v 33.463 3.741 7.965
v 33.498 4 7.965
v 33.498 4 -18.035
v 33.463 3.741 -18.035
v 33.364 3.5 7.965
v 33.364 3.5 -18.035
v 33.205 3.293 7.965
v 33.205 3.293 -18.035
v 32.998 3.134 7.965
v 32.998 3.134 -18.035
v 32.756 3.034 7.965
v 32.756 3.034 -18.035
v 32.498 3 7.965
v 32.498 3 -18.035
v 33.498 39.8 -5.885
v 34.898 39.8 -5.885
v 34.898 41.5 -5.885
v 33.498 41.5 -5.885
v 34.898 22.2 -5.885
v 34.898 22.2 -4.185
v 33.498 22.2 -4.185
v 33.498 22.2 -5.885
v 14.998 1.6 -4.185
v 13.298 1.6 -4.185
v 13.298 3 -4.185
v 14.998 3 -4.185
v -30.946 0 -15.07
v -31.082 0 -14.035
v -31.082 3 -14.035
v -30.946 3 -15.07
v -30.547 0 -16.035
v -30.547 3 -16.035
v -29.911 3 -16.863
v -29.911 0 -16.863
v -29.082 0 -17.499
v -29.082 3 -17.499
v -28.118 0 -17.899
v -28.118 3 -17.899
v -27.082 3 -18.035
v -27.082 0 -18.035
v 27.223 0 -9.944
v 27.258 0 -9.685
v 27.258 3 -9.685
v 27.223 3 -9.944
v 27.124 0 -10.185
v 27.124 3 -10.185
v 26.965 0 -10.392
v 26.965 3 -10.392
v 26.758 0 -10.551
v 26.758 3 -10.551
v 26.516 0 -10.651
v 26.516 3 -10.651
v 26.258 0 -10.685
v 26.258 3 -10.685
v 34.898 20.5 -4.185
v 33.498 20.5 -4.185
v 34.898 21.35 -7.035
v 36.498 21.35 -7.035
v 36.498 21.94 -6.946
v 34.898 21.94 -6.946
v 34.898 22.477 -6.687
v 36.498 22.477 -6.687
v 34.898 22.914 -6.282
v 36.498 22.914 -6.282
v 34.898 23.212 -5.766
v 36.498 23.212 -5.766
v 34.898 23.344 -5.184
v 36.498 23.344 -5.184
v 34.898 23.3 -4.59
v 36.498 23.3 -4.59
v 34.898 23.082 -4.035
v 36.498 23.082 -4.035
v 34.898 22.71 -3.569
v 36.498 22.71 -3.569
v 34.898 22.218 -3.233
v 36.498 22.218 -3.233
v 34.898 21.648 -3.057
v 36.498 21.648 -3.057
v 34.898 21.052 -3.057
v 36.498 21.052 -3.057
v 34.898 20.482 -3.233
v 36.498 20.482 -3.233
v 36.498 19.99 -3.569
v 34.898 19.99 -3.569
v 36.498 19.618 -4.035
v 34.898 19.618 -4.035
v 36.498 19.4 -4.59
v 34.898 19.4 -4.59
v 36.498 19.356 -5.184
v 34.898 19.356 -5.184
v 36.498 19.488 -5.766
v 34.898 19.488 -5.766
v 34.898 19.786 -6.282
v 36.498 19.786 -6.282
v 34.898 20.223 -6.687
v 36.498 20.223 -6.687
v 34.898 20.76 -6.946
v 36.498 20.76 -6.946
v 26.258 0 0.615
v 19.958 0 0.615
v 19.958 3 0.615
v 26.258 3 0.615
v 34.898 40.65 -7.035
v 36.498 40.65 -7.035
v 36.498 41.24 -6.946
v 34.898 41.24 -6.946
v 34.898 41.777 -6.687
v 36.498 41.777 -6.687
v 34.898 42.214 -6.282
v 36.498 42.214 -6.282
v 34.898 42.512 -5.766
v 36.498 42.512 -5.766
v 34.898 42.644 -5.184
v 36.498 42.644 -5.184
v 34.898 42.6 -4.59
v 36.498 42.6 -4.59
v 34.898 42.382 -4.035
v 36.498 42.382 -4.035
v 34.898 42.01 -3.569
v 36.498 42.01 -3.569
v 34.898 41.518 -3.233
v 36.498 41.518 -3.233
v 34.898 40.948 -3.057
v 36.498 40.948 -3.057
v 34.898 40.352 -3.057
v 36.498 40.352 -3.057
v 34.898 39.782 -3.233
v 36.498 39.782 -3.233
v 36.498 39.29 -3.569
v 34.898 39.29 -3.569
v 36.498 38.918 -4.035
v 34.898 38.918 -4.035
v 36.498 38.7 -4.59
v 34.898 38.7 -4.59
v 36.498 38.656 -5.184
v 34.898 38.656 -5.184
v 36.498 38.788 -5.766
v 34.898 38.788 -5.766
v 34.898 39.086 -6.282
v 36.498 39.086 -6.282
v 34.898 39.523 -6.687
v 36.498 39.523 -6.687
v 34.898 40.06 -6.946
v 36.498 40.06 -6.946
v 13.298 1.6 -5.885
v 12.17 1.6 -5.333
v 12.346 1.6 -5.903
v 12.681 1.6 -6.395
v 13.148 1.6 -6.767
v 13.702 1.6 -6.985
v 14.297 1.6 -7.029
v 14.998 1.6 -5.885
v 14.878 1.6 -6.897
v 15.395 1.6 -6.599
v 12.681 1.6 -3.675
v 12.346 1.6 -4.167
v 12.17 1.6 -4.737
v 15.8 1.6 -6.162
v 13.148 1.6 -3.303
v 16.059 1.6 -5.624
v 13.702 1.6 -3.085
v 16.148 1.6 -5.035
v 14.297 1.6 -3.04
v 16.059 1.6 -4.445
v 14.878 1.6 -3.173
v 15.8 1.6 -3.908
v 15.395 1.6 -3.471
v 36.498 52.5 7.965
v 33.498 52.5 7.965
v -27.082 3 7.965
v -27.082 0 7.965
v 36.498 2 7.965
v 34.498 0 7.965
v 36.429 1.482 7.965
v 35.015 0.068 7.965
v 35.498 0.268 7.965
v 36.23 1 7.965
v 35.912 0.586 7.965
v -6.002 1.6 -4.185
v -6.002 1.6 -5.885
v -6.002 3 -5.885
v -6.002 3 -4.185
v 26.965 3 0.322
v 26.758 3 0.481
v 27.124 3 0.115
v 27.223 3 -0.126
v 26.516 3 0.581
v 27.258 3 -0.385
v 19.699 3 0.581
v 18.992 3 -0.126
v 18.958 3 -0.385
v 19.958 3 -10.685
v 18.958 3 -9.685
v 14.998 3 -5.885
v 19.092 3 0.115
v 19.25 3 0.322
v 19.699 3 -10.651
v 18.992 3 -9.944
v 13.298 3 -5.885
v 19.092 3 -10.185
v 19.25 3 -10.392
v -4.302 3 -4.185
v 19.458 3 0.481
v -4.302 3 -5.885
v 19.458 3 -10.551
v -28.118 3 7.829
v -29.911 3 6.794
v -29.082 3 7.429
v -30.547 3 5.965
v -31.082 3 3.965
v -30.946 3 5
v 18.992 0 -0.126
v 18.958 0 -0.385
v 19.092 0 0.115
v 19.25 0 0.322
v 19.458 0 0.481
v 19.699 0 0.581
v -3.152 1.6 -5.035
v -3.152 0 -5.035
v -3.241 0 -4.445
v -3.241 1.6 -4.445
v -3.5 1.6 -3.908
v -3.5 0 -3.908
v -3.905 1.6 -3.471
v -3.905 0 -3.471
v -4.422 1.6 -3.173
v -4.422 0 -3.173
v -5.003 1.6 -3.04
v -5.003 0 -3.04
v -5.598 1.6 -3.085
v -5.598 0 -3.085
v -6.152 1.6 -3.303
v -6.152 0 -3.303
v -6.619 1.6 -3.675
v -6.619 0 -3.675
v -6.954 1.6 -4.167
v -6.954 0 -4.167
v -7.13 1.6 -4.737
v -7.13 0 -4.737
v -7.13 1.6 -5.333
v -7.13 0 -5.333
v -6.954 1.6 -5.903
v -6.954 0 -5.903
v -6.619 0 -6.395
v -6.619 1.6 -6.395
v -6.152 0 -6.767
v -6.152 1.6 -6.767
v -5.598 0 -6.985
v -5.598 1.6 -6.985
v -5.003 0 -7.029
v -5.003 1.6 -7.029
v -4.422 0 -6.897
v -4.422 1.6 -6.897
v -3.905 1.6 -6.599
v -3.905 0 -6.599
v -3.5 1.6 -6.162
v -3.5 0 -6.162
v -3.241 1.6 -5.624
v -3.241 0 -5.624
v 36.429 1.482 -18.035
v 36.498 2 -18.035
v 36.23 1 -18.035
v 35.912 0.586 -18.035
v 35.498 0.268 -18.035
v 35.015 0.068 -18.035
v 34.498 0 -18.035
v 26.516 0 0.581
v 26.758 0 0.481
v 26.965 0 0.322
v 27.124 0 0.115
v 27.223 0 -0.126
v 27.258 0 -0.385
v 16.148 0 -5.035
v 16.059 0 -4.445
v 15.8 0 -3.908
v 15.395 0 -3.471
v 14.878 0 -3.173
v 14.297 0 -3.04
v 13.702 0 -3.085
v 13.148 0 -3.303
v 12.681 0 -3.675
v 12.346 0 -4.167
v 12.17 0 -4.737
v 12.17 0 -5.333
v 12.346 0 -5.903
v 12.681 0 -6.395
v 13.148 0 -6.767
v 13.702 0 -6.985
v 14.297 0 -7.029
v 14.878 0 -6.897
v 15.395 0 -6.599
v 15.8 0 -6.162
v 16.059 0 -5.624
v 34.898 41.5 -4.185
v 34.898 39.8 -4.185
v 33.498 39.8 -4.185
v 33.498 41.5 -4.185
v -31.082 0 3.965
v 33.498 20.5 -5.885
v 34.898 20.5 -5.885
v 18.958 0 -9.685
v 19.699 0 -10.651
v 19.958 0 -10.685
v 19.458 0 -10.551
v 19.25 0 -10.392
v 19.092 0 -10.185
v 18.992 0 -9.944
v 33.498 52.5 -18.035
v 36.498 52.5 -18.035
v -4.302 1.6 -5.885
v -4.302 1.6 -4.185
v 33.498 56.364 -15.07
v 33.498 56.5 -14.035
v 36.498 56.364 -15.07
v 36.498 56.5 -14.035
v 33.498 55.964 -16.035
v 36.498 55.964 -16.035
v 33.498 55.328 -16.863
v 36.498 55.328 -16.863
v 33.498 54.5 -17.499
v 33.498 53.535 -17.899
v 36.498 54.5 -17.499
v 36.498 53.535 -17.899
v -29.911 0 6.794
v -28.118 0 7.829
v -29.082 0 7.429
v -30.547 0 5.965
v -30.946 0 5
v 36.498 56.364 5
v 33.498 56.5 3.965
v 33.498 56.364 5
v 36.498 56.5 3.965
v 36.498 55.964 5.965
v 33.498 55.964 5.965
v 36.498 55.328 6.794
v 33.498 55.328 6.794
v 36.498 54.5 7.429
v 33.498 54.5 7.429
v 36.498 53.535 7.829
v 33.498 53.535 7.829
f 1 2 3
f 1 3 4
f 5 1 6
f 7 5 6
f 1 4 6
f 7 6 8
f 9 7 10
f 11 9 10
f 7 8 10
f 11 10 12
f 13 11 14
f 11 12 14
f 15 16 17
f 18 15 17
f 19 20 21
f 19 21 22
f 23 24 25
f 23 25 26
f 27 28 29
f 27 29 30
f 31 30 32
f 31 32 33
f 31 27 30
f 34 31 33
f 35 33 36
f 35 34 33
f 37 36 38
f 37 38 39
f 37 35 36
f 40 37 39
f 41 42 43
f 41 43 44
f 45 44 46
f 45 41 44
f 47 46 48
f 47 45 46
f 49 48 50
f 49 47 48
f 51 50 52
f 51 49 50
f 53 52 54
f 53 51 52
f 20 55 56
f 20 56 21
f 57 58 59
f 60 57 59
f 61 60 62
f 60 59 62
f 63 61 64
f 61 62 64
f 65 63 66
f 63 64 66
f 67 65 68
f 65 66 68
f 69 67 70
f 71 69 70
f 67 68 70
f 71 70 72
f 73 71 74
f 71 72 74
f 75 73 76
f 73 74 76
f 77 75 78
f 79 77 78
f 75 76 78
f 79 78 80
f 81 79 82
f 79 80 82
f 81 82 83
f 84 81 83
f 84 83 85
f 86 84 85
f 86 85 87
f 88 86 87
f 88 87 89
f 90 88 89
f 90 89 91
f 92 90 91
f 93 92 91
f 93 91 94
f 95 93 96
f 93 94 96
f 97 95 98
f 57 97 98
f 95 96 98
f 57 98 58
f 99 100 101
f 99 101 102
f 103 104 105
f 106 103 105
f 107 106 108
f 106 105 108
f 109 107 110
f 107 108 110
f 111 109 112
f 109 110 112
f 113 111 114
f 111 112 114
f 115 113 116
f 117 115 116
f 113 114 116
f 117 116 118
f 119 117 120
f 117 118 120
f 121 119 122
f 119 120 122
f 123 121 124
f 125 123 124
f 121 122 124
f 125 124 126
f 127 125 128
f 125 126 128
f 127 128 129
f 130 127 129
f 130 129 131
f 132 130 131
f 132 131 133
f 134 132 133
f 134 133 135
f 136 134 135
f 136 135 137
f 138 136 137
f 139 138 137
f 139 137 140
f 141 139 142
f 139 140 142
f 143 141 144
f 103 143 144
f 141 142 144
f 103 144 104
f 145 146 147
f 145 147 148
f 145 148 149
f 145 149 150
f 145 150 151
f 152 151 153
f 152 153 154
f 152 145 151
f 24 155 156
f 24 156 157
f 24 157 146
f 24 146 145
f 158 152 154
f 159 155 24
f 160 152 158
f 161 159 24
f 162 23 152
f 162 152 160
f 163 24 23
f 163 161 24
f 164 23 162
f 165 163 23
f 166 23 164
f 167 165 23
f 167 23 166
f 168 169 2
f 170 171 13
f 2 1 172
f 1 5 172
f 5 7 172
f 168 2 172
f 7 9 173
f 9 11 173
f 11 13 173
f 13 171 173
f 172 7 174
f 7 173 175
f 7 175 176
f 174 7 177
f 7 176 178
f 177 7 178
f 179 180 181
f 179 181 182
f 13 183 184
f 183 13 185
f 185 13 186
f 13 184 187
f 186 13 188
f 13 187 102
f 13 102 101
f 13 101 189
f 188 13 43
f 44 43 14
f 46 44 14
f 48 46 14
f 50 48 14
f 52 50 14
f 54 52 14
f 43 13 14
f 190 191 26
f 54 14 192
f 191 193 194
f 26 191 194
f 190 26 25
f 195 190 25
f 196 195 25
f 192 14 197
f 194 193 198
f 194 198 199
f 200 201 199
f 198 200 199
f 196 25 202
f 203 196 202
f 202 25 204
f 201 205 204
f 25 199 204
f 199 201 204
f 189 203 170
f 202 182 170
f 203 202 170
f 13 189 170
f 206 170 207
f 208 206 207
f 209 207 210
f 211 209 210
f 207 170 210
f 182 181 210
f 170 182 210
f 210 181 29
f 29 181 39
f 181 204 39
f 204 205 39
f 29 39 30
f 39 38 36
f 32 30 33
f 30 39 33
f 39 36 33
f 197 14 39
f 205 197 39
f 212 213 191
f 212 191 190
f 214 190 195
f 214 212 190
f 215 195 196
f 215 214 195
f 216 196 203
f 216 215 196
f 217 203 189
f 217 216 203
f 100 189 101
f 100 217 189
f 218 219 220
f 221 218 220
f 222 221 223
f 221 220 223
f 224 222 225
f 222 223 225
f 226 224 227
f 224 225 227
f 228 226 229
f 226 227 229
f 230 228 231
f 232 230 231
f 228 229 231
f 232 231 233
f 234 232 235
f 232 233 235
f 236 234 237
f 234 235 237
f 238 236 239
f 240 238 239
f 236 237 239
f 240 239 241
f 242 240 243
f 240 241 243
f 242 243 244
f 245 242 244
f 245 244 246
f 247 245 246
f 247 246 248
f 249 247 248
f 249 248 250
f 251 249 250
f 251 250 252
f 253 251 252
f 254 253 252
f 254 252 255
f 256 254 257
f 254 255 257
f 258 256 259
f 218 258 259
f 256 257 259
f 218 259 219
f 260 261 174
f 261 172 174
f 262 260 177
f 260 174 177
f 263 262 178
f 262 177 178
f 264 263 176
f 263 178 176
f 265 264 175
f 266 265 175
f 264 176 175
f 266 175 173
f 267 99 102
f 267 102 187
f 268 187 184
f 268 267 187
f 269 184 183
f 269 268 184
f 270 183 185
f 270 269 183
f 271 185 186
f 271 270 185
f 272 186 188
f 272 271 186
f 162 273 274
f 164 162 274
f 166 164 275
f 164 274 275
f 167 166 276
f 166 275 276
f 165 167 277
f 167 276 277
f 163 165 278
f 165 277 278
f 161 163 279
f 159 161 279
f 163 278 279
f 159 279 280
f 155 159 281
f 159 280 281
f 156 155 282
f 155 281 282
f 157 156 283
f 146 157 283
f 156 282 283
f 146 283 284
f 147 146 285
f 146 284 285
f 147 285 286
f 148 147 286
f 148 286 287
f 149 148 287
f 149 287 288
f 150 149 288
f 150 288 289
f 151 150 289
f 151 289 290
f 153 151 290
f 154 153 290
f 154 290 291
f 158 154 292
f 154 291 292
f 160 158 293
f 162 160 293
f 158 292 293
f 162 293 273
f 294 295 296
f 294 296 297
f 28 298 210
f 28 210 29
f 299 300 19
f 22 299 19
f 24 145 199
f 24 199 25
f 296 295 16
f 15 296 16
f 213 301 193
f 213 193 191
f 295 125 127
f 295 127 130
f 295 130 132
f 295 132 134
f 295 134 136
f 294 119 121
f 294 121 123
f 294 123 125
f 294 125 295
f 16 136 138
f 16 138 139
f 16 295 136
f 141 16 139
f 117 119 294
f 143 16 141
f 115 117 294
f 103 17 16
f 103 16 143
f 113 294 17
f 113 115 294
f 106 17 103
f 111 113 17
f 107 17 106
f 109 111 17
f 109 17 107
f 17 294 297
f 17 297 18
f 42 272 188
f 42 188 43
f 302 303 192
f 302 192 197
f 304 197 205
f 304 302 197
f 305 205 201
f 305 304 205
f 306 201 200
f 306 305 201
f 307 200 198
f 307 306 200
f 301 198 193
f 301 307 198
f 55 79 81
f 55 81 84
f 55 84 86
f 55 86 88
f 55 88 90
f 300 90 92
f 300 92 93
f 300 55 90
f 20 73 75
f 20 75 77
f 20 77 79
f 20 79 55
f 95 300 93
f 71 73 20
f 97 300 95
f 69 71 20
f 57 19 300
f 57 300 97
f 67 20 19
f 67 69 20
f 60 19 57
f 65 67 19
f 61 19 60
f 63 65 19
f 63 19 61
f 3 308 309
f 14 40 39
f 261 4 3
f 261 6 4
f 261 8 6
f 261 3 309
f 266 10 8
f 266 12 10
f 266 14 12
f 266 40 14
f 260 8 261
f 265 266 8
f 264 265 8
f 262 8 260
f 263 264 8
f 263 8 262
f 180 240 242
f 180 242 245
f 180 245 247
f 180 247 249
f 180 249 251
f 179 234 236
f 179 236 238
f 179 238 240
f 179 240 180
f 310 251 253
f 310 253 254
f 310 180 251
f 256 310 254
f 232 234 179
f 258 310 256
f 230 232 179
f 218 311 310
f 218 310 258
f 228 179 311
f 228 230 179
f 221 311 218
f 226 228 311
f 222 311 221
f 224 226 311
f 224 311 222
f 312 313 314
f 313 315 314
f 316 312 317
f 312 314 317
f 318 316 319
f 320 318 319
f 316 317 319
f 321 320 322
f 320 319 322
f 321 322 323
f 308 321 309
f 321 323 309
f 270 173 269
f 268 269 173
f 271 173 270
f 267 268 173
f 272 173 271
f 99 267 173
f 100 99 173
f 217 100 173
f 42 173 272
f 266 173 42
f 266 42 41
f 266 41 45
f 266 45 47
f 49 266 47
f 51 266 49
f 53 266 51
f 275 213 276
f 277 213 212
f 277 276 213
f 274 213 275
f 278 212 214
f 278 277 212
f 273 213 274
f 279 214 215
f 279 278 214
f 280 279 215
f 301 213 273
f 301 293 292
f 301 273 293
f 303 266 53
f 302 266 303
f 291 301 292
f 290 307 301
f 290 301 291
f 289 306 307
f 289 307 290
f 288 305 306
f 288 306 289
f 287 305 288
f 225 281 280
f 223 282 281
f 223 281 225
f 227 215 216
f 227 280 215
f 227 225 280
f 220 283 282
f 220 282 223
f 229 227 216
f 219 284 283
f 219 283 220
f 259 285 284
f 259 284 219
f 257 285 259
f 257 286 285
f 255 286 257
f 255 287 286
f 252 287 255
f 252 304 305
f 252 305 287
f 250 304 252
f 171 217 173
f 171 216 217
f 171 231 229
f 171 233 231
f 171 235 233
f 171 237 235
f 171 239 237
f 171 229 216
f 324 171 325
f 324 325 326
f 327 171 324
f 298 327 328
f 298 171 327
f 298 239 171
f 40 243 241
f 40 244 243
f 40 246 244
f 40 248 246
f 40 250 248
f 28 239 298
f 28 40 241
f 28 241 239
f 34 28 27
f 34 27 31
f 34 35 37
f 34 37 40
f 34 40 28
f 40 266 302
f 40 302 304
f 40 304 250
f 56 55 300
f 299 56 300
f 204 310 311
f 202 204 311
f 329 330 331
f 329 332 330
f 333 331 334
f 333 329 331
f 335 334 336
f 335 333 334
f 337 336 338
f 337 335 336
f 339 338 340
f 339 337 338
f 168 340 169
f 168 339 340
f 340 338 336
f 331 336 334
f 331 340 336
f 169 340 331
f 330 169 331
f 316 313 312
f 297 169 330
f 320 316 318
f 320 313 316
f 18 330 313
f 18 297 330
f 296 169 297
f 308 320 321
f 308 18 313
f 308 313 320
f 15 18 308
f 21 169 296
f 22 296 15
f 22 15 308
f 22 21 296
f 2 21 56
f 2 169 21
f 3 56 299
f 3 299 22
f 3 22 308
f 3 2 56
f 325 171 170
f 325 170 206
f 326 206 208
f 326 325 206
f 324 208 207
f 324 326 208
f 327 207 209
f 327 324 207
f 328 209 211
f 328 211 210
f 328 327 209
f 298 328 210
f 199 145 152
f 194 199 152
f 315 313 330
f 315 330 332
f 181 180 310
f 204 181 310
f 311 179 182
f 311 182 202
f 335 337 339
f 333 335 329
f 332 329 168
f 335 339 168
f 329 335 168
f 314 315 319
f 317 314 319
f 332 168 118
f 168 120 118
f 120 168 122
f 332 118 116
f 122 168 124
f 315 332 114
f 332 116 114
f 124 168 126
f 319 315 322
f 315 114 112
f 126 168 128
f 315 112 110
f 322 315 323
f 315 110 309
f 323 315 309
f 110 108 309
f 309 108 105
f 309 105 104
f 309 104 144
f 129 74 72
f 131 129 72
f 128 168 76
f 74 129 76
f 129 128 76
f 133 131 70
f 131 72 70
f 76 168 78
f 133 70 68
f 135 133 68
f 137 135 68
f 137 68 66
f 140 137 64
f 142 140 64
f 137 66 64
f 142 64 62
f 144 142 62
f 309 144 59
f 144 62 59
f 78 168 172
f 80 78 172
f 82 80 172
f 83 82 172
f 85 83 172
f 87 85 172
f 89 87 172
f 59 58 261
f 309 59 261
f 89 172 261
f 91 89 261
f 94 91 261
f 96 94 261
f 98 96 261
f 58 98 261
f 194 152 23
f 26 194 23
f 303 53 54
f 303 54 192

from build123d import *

# Parameters (mm, degrees)
EXTRUDE_1_DEPTH     = 3
SKETCH_2_W          = 3
SKETCH_2_H          = 26
EXTRUDE_2_DEPTH     = 53.5
FILLET_1_R          = 4
FILLET_2_R          = 2
FILLET_3_R          = 1
SKETCH_3_W          = 1.7
SKETCH_3_H          = 1.7
CUT_EXTRUDE_1_DEPTH = 3
SKETCH_4_R          = 2
CUT_EXTRUDE_2_DEPTH = 1.6
SKETCH_5_W          = 1.7
SKETCH_5_H          = 1.7
CUT_EXTRUDE_3_DEPTH = 3
SKETCH_6_R          = 2
CUT_EXTRUDE_4_DEPTH = 1.6
CUT_EXTRUDE_5_DEPTH = 3


with BuildPart() as part:
    # Эскиз1 → Бобышка-Вытянуть1 (new body)
    with BuildSketch(Plane(origin=(0, 0, 0), x_dir=(1, 0, 0), z_dir=(0, 1, 0))):
        with BuildLine():
            Line((-27.082461997, 18.034885268), (36.497538003, 18.034885268))
            Line((36.497538003, 18.034885268), (36.497538003, -7.965114732))
            Line((36.497538003, -7.965114732), (-27.082461997, -7.965114732))
            ThreePointArc((-27.082461997, -7.965114732), (-29.910889121, -6.793541857), (-31.082461997, -3.965114732))
            Line((-31.082461997, -3.965114732), (-31.082461997, 14.034885268))
            ThreePointArc((-31.082461997, 14.034885268), (-29.910889121, 16.863312393), (-27.082461997, 18.034885268))
        make_face()
    extrude(amount=EXTRUDE_1_DEPTH)

    # Эскиз2 → Бобышка-Вытянуть2 (add)
    with BuildSketch(Plane(origin=(0, 3, 0), x_dir=(1, 0, 0), z_dir=(0, 1, 0))):
        with Locations((34.997538003, 5.034885268)):
            Rectangle(SKETCH_2_W, SKETCH_2_H)
    extrude(amount=EXTRUDE_2_DEPTH)

    # Скругление1
    fillet_1_edges = [part.edges().sort_by_distance(p)[0] for p in [
        (34.997538003, 56.5, -18.034885268),
        (34.997538003, 56.5, 7.965114732),
    ]]
    fillet(fillet_1_edges, radius=FILLET_1_R)

    # Скругление2
    fillet_2_edges = [part.edges().sort_by_distance(p)[0] for p in [
        (36.497538003, 0, -5.034885268),
    ]]
    fillet(fillet_2_edges, radius=FILLET_2_R)

    # Скругление3
    fillet_3_edges = [part.edges().sort_by_distance(p)[0] for p in [
        (33.497538003, 3, -5.034885268),
    ]]
    fillet(fillet_3_edges, radius=FILLET_3_R)

    # Эскиз3 → Вырез-Вытянуть1 (cut)
    with BuildSketch(Plane.XZ):
        with Locations((-5.152461997, -5.034885268)):
            Rectangle(SKETCH_3_W, SKETCH_3_H)
        with Locations((14.147538003, -5.034885268)):
            Rectangle(SKETCH_3_W, SKETCH_3_H)
    extrude(amount=-CUT_EXTRUDE_1_DEPTH, mode=Mode.SUBTRACT)

    # Эскиз4 → Вырез-Вытянуть2 (cut)
    with BuildSketch(Plane.XZ):
        with Locations((-5.152461997, -5.034885268)):
            Circle(SKETCH_4_R)
        with Locations((14.147538003, -5.034885268)):
            Circle(SKETCH_4_R)
    extrude(amount=-CUT_EXTRUDE_2_DEPTH, mode=Mode.SUBTRACT)

    # Эскиз5 → Вырез-Вытянуть3 (cut)
    with BuildSketch(Plane(origin=(36.497538003, 0, 0), x_dir=(0, 0, -1), z_dir=(1, 0, 0))):
        with Locations((5.034885268, 21.35)):
            Rectangle(SKETCH_5_W, SKETCH_5_H)
        with Locations((5.034885268, 40.65)):
            Rectangle(SKETCH_5_W, SKETCH_5_H)
    extrude(amount=-CUT_EXTRUDE_3_DEPTH, mode=Mode.SUBTRACT)

    # Эскиз6 → Вырез-Вытянуть4 (cut)
    with BuildSketch(Plane(origin=(36.497538003, 0, 0), x_dir=(0, 0, -1), z_dir=(1, 0, 0))):
        with Locations((5.034885268, 40.65)):
            Circle(SKETCH_6_R)
        with Locations((5.034885268, 21.35)):
            Circle(SKETCH_6_R)
    extrude(amount=-CUT_EXTRUDE_4_DEPTH, mode=Mode.SUBTRACT)

    # Эскиз7 → Вырез-Вытянуть5 (cut)
    with BuildSketch(Plane.XZ):
        with BuildLine():
            Line((19.957538003, 0.615114732), (26.257538003, 0.615114732))
            ThreePointArc((26.257538003, 0.615114732), (26.964644784, 0.322221513), (27.257538003, -0.384885268))
            Line((27.257538003, -0.384885268), (27.257538003, -9.684885268))
            ThreePointArc((27.257538003, -9.684885268), (26.964644784, -10.391992049), (26.257538003, -10.684885268))
            Line((26.257538003, -10.684885268), (19.957538003, -10.684885268))
            ThreePointArc((19.957538003, -10.684885268), (19.250431222, -10.391992049), (18.957538003, -9.684885268))
            Line((18.957538003, -9.684885268), (18.957538003, -0.384885268))
            ThreePointArc((18.957538003, -0.384885268), (19.250431222, 0.322221513), (19.957538003, 0.615114732))
        make_face()
    extrude(amount=-CUT_EXTRUDE_5_DEPTH, mode=Mode.SUBTRACT)


solid = part.part
